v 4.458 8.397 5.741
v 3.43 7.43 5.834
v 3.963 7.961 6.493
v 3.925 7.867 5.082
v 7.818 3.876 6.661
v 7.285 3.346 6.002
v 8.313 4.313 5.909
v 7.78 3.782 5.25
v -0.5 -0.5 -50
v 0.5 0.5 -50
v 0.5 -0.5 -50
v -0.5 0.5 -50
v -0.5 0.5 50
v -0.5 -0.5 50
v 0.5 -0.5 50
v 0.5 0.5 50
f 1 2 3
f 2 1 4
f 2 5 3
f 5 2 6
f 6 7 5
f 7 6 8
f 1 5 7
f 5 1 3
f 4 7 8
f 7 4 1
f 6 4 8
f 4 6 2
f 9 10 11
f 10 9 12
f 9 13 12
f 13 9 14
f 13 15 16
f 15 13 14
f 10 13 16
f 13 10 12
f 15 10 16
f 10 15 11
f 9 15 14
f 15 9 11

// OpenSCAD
polyline = [[0,0,0],[2,2,2],[6,4,8],[10,12,14]];

section = 1;
extra_space = 0.25*section;

numpoints = len(polyline);

// LINEAR EXTRUDE HERE
if(numpoints == 2) {
    // from polyline at n linear extrude until [1]
    translate(polyline[n])
    /// rotate angles from things
    rotate([anglexaxis(polyline[n], polyline[n+1]),
    angleyaxis(polyline[n], polyline[n+1]),
    anglezaxis(polyline[n], polyline[n+1])])
    linear_extrude(height = lnelem(polyline[n], polyline[n+1]), center = true)
    shape();
}

// range is inclusive on both ends
for (n =[0:numpoints-1]) {
  // if not first point, because at P0 there is nothing to do


  if(n != 0) {
    // at P1 (and if larger than 1 polyline) and further there are rotate extrudes
    if(n >= 1 && numpoints >= 2 && n < (numpoints - 1))
    {
      echo("num:",str(n)); // ok thing goes "1", "2" that's ok
        rotateExtrMidPolyline(polyline[n-1], polyline[n], polyline[n+1]);
    }
    if(n>=2 && n < numpoints-1) {
        linearExtrMidPolyline(polyline[n-1], polyline[n], polyline[n+1]) ;
    }
    if(n == numpoints-1) {
        linearExtrLatest(polyline[n-1], polyline[n], polyline[n+1]);
    }
  }

}

module rotateExtrMidPolyline(pPrev, pCur, pNext) {
  tempX = xcoordProtate(pPrev, pCur, pNext);
  tempY = ycoordProtate(pPrev, pCur, pNext);
  tempZ = zcoordProtate(pPrev, pCur, pNext);
  translate([tempX,tempY,tempZ])
  rotate([anglexaxis([tempX,tempY,tempZ], pCur),
  angleyaxis([tempX,tempY,tempZ], pCur),
  anglezaxis([tempX,tempY,tempZ], pCur)])
  rotate_extrude(angle = theta(pPrev,pCur,pNext))
  shape();
}


module linearExtrMidPolyline(pPrev, pCur, pNext) {
  // translate to margin
  tempCoordMarginX = rotateVectorProjOntoVectXBeginNext(pPrev, pCur, pNext);
  tempCoordMarginY = rotateVectorProjOntoVectXBeginNext(pPrev, pCur, pNext);
  tempCoordMarginZ = rotateVectorProjOntoVectXBeginNext(pPrev, pCur, pNext);
  translate([tempCoordMarginX,tempCoordMarginY,tempCoordMarginZ])
  //rotate towards  n+1

  // too many unnamed argumetns
  rotate([anglexaxis([tempCoordMarginX,tempCoordMarginY,tempCoordMarginZ], pCur),
  angleyaxis([tempCoordMarginX,tempCoordMarginY,tempCoordMarginZ], pCur),
  anglezaxis([tempCoordMarginX,tempCoordMarginY,tempCoordMarginZ], pCur)])
  linear_extrude(height = (lnelem(pCur, pNext) - (2 * margin(pPrev, pCur, pNext))), center = true)
  shape();
}


module linearExtrLatest(pPrev, pCur, pNext) {
  //linear extrude until last point
  //translate and rotate
  linear_extrude(height = (lnelem(pCur, pNext) - margin(pPrev, pCur, pNext)), center = true)
  shape();
}

module shape() {
    square(size = [section, section], center = true);
}

// every argument is an [x,y,z] vector
function margin(pPrevious, pCurrent, pNext) =
(0.5 * section + extra_space) / tan(0.5 * theta(pPrevious, pCurrent, pNext));

function lnelem(p0, p1) =
let (x0 = p0[0]) let (x1 = p1[0]) let (y0 = p0[1]) let (y1 = p1[1]) let (z0 = p0[2]) let (z1 = p1[2])
abs(
  sqrt(
    pow(abs(x1 - x0),2)+
    pow(abs(y1 - y0),2)+
    pow(abs(z1 - z0),2)
  )
);

// scalar components HOWEVER does include power of two of length
function rotateScalarCompProjOntoVectPreviousEnd(pPrevious, pCurrent, pNext) =
  let (xPrevious = pPrevious[0]) let (yPrevious = pPrevious[1]) let (zPrevious = pPrevious[2])
  let (xCurrent = pCurrent[0]) let (yCurrent = pCurrent[1]) let (zCurrent = pCurrent[2])
  let (xNext = pNext[0]) let (yNext = pNext[1]) let (zNext = pNext[2])
  let (vecXrotate = xcoordProtate(pPrevious, pCurrent, pNext))
  let (vecYrotate = ycoordProtate(pPrevious, pCurrent, pNext))
  let (vecZrotate = zcoordProtate(pPrevious, pCurrent, pNext))
dotproduct(pCurrent, [vecXrotate,vecYrotate,vecZrotate])/pow(lnelem(pPrevious, pCurrent),2);

function rotateScalarCompProjOntoVectBeginNext(pPrevious, pCurrent, pNext) =
  let (xPrevious = pPrevious[0]) let (yPrevious = pPrevious[1]) let (zPrevious = pPrevious[2])
  let (xCurrent = pCurrent[0]) let (yCurrent = pCurrent[1]) let (zCurrent = pCurrent[2])
  let (xNext = pNext[0]) let (yNext = pNext[1]) let (zNext = pNext[2])
  let (vecXrotate = xcoordProtate(pPrevious, pCurrent, pNext))
  let (vecYrotate = ycoordProtate(pPrevious, pCurrent, pNext))
  let (vecZrotate = zcoordProtate(pPrevious, pCurrent, pNext))
dotproduct(pNext, [vecXrotate,vecYrotate,vecZrotate])/pow(lnelem(pCurrent, pNext),2);

// to find location of vector minus margin
function rotateVectorProjOntoVectXPreviousEnd(pPrevious, pCurrent, pNext) =
let (xPrevious = pPrevious[0]) let (yPrevious = pPrevious[1]) let (zPrevious = pPrevious[2])
let (xCurrent = pCurrent[0]) let (yCurrent = pCurrent[1]) let (zCurrent = pCurrent[2])
let (xNext = pNext[0]) let (yNext = pNext[1]) let (zNext = pNext[2])
rotateScalarCompProjOntoVectPreviousEnd(pPrevious, pCurrent, pNext)*xCurrent;

function rotateVectorProjOntoVectYPreviousEnd(pPrevious, pCurrent, pNext) =
let (xPrevious = pPrevious[0]) let (yPrevious = pPrevious[1]) let (zPrevious = pPrevious[2])
let (xCurrent = pCurrent[0]) let (yCurrent = pCurrent[1]) let (zCurrent = pCurrent[2])
let (xNext = pNext[0]) let (yNext = pNext[1]) let (zNext = pNext[2])
rotateScalarCompProjOntoVectPreviousEnd(pPrevious, pCurrent, pNext)*yCurrent;

function rotateVectorProjOntoVectZPreviousEnd(pPrevious, pCurrent, pNext) =
let (xPrevious = pPrevious[0]) let (yPrevious = pPrevious[1]) let (zPrevious = pPrevious[2])
let (xCurrent = pCurrent[0]) let (yCurrent = pCurrent[1]) let (zCurrent = pCurrent[2])
let (xNext = pNext[0]) let (yNext = pNext[1]) let (zNext = pNext[2])
rotateScalarCompProjOntoVectPreviousEnd(pPrevious, pCurrent, pNext)*zCurrent;

function rotateVectorProjOntoVectXBeginNext(pPrevious, pCurrent, pNext) =
let (xNext = pNext[0])
rotateScalarCompProjOntoVectBeginNext(pPrevious, pCurrent, pNext)*xNext;

function rotateVectorProjOntoVectYBeginNext(pPrevious, pCurrent, pNext) =
let (xPrevious = pPrevious[0]) let (yPrevious = pPrevious[1]) let (zPrevious = pPrevious[2])
let (xCurrent = pCurrent[0]) let (yCurrent = pCurrent[1]) let (zCurrent = pCurrent[2])
let (xNext = pNext[0]) let (yNext = pNext[1]) let (zNext = pNext[2])
rotateScalarCompProjOntoVectBeginNext(pPrevious, pCurrent, pNext)*yNext;

function rotateVectorProjOntoVectZBeginNext(pPrevious, pCurrent, pNext) =
let (xPrevious = pPrevious[0]) let (yPrevious = pPrevious[1]) let (zPrevious = pPrevious[2])
let (xCurrent = pCurrent[0]) let (yCurrent = pCurrent[1]) let (zCurrent = pCurrent[2])
let (xNext = pNext[0]) let (yNext = pNext[1]) let (zNext = pNext[2])
rotateScalarCompProjOntoVectBeginNext(pPrevious, pCurrent, pNext)*zNext;

function dotproduct(p0, p1) =
let (x0 = p0[0]) let (x1 = p1[0]) let (y0 = p0[1]) let (y1 = p1[1]) let (z0 = p0[2]) let (z1 = p1[2])
x0 * x1 + y0 * y1 + z0 * z1;

function anglexaxis(p0, p1)  =
let (x0 = p0[0]) let (x1 = p1[0]) let (y0 = p0[1]) let (y1 = p1[1]) let (z0 = p0[2]) let (z1 = p1[2])
acos(abs(x1-x0)/lnelem(p0, p1));

function angleyaxis(p0, p1)  =
let (x0 = p0[0]) let (x1 = p1[0]) let (y0 = p0[1]) let (y1 = p1[1]) let (z0 = p0[2]) let (z1 = p1[2])
acos(abs(y1-y0)/lnelem(p0, p1));

function anglezaxis(p0, p1)  =
let (x0 = p0[0]) let (x1 = p1[0]) let (y0 = p0[1]) let (y1 = p1[1]) let (z0 = p0[2]) let (z1 = p1[2])
acos(abs(z1-x0)/lnelem(p0, p1));

function lnxcomp(p0, p1) =
let (x0 = p0[0]) let (x1 = p1[0]) let (y0 = p0[1]) let (y1 = p1[1]) let (z0 = p0[2]) let (z1 = p1[2])
abs(x1-x0);

function lnycomp(p0, p1) =
let (x0 = p0[0]) let (x1 = p1[0]) let (y0 = p0[1]) let (y1 = p1[1]) let (z0 = p0[2]) let (z1 = p1[2])
abs(y1-y0);

function lnzcomp(p0, p1) =
let (x0 = p0[0]) let (x1 = p1[0]) let (y0 = p0[1]) let (y1 = p1[1]) let (z0 = p0[2]) let (z1 = p1[2])
// undef
abs(z1-z0);


function theta(pPrevious, pCurrent, pNext) =
// check somewhere theta not used when pCurrent is nmax
echo(str(pNext))
acos(
  //ln things need TWO arguments
(lnxcomp(pCurrent, pNext) * lnxcomp(pPrevious, pCurrent) +
lnycomp(pCurrent, pNext) * lnycomp(pPrevious, pCurrent) +
lnzcomp(pCurrent, pNext) * lnzcomp(pPrevious, pCurrent))
/ ( (abs(sqrt(
      pow(abs(lnxcomp(pPrevious, pCurrent)),2)+
      pow(abs(lnycomp(pPrevious, pCurrent)),2)+
      pow(abs(lnzcomp(pPrevious, pCurrent)),2)))*
    abs(sqrt(
      pow(abs(lnxcomp(pCurrent, pNext)),2)+
      pow(abs(lnycomp(pCurrent, pNext)),2)+
      pow(abs(lnzcomp(pCurrent, pNext)),2))
))));



// functions for rotate vector where x,y,z 0 = n-1, x,y,z 1 = n
function lnRotationPointVector(pPrevious, pCurrent, pNext) =
let (xPrevious = pPrevious[0]) let (yPrevious = pPrevious[1]) let (zPrevious = pPrevious[2])
let (xCurrent = pCurrent[0]) let (yCurrent = pCurrent[1]) let (zCurrent = pCurrent[2])
let (xNext = pNext[0]) let (yNext = pNext[1]) let (zNext = pNext[2])
(0.5*section+extra_space) / sin(0.5*theta(pPrevious, pCurrent, pNext));

function anglPolylineSegmentXaxis(pPrevious, pCurrent, pNext) =
let (xPrevious = pPrevious[0]) let (yPrevious = pPrevious[1]) let (zPrevious = pPrevious[2])
let (xCurrent = pCurrent[0]) let (yCurrent = pCurrent[1]) let (zCurrent = pCurrent[2])
let (xNext = pNext[0]) let (yNext = pNext[1]) let (zNext = pNext[2])
anglexaxis(pPrevious, pCurrent) + theta(pPrevious, pCurrent, pNext) - 180;

function anglPolylineSegmentYaxis(pPrevious, pCurrent, pNext) =
let (xPrevious = pPrevious[0]) let (yPrevious = pPrevious[1]) let (zPrevious = pPrevious[2])
let (xCurrent = pCurrent[0]) let (yCurrent = pCurrent[1]) let (zCurrent = pCurrent[2])
let (xNext = pNext[0]) let (yNext = pNext[1]) let (zNext = pNext[2])
angleyaxis(pPrevious, pCurrent) + theta(pPrevious, pCurrent, pNext) - 180;

function anglPolylineSegmentZaxis(pPrevious, pCurrent, pNext) =
let (xPrevious = pPrevious[0]) let (yPrevious = pPrevious[1]) let (zPrevious = pPrevious[2])
let (xCurrent = pCurrent[0]) let (yCurrent = pCurrent[1]) let (zCurrent = pCurrent[2])
let (xNext = pNext[0]) let (yNext = pNext[1]) let (zNext = pNext[2])
anglezaxis(pPrevious, pCurrent) + theta(pPrevious, pCurrent, pNext) - 180;

function xcompRotationVector(pPrevious, pCurrent, pNext) =
let (xPrevious = pPrevious[0]) let (yPrevious = pPrevious[1]) let (zPrevious = pPrevious[2])
let (xCurrent = pCurrent[0]) let (yCurrent = pCurrent[1]) let (zCurrent = pCurrent[2])
let (xNext = pNext[0]) let (yNext = pNext[1]) let (zNext = pNext[2])
lnRotationPointVector(pPrevious, pCurrent, pNext) * cos(anglPolylineSegmentXaxis(pPrevious, pCurrent, pNext));

function ycompRotationVector(pPrevious, pCurrent, pNext) =
let (xPrevious = pPrevious[0]) let (yPrevious = pPrevious[1]) let (zPrevious = pPrevious[2])
let (xCurrent = pCurrent[0]) let (yCurrent = pCurrent[1]) let (zCurrent = pCurrent[2])
let (xNext = pNext[0]) let (yNext = pNext[1]) let (zNext = pNext[2])
lnRotationPointVector(pPrevious, pCurrent, pNext) * cos(anglPolylineSegmentYaxis(pPrevious, pCurrent, pNext));

function zcompRotationVector(pPrevious, pCurrent, pNext) =
let (xPrevious = pPrevious[0]) let (yPrevious = pPrevious[1]) let (zPrevious = pPrevious[2])
let (xCurrent = pCurrent[0]) let (yCurrent = pCurrent[1]) let (zCurrent = pCurrent[2])
let (xNext = pNext[0]) let (yNext = pNext[1]) let (zNext = pNext[2])
lnRotationPointVector(pPrevious, pCurrent, pNext) * cos(anglPolylineSegmentZaxis(pPrevious, pCurrent, pNext));

function xcoordProtate(pPrevious, pCurrent, pNext) =
let (xPrevious = pPrevious[0]) let (yPrevious = pPrevious[1]) let (zPrevious = pPrevious[2])
let (xCurrent = pCurrent[0]) let (yCurrent = pCurrent[1]) let (zCurrent = pCurrent[2])
let (xNext = pNext[0]) let (yNext = pNext[1]) let (zNext = pNext[2])
xcompRotationVector(pPrevious, pCurrent, pNext) + xPrevious;

function ycoordProtate(pPrevious, pCurrent, pNext) =
let (xPrevious = pPrevious[0]) let (yPrevious = pPrevious[1]) let (zPrevious = pPrevious[2])
let (xCurrent = pCurrent[0]) let (yCurrent = pCurrent[1]) let (zCurrent = pCurrent[2])
let (xNext = pNext[0]) let (yNext = pNext[1]) let (zNext = pNext[2])
ycompRotationVector(pPrevious, pCurrent, pNext) + yPrevious;

function zcoordProtate(pPrevious, pCurrent, pNext) =
let (xPrevious = pPrevious[0]) let (yPrevious = pPrevious[1]) let (zPrevious = pPrevious[2])
let (xCurrent = pCurrent[0]) let (yCurrent = pCurrent[1]) let (zCurrent = pCurrent[2])
let (xNext = pNext[0]) let (yNext = pNext[1]) let (zNext = pNext[2])
zcompRotationVector(pPrevious, pCurrent, pNext) + zPrevious;
